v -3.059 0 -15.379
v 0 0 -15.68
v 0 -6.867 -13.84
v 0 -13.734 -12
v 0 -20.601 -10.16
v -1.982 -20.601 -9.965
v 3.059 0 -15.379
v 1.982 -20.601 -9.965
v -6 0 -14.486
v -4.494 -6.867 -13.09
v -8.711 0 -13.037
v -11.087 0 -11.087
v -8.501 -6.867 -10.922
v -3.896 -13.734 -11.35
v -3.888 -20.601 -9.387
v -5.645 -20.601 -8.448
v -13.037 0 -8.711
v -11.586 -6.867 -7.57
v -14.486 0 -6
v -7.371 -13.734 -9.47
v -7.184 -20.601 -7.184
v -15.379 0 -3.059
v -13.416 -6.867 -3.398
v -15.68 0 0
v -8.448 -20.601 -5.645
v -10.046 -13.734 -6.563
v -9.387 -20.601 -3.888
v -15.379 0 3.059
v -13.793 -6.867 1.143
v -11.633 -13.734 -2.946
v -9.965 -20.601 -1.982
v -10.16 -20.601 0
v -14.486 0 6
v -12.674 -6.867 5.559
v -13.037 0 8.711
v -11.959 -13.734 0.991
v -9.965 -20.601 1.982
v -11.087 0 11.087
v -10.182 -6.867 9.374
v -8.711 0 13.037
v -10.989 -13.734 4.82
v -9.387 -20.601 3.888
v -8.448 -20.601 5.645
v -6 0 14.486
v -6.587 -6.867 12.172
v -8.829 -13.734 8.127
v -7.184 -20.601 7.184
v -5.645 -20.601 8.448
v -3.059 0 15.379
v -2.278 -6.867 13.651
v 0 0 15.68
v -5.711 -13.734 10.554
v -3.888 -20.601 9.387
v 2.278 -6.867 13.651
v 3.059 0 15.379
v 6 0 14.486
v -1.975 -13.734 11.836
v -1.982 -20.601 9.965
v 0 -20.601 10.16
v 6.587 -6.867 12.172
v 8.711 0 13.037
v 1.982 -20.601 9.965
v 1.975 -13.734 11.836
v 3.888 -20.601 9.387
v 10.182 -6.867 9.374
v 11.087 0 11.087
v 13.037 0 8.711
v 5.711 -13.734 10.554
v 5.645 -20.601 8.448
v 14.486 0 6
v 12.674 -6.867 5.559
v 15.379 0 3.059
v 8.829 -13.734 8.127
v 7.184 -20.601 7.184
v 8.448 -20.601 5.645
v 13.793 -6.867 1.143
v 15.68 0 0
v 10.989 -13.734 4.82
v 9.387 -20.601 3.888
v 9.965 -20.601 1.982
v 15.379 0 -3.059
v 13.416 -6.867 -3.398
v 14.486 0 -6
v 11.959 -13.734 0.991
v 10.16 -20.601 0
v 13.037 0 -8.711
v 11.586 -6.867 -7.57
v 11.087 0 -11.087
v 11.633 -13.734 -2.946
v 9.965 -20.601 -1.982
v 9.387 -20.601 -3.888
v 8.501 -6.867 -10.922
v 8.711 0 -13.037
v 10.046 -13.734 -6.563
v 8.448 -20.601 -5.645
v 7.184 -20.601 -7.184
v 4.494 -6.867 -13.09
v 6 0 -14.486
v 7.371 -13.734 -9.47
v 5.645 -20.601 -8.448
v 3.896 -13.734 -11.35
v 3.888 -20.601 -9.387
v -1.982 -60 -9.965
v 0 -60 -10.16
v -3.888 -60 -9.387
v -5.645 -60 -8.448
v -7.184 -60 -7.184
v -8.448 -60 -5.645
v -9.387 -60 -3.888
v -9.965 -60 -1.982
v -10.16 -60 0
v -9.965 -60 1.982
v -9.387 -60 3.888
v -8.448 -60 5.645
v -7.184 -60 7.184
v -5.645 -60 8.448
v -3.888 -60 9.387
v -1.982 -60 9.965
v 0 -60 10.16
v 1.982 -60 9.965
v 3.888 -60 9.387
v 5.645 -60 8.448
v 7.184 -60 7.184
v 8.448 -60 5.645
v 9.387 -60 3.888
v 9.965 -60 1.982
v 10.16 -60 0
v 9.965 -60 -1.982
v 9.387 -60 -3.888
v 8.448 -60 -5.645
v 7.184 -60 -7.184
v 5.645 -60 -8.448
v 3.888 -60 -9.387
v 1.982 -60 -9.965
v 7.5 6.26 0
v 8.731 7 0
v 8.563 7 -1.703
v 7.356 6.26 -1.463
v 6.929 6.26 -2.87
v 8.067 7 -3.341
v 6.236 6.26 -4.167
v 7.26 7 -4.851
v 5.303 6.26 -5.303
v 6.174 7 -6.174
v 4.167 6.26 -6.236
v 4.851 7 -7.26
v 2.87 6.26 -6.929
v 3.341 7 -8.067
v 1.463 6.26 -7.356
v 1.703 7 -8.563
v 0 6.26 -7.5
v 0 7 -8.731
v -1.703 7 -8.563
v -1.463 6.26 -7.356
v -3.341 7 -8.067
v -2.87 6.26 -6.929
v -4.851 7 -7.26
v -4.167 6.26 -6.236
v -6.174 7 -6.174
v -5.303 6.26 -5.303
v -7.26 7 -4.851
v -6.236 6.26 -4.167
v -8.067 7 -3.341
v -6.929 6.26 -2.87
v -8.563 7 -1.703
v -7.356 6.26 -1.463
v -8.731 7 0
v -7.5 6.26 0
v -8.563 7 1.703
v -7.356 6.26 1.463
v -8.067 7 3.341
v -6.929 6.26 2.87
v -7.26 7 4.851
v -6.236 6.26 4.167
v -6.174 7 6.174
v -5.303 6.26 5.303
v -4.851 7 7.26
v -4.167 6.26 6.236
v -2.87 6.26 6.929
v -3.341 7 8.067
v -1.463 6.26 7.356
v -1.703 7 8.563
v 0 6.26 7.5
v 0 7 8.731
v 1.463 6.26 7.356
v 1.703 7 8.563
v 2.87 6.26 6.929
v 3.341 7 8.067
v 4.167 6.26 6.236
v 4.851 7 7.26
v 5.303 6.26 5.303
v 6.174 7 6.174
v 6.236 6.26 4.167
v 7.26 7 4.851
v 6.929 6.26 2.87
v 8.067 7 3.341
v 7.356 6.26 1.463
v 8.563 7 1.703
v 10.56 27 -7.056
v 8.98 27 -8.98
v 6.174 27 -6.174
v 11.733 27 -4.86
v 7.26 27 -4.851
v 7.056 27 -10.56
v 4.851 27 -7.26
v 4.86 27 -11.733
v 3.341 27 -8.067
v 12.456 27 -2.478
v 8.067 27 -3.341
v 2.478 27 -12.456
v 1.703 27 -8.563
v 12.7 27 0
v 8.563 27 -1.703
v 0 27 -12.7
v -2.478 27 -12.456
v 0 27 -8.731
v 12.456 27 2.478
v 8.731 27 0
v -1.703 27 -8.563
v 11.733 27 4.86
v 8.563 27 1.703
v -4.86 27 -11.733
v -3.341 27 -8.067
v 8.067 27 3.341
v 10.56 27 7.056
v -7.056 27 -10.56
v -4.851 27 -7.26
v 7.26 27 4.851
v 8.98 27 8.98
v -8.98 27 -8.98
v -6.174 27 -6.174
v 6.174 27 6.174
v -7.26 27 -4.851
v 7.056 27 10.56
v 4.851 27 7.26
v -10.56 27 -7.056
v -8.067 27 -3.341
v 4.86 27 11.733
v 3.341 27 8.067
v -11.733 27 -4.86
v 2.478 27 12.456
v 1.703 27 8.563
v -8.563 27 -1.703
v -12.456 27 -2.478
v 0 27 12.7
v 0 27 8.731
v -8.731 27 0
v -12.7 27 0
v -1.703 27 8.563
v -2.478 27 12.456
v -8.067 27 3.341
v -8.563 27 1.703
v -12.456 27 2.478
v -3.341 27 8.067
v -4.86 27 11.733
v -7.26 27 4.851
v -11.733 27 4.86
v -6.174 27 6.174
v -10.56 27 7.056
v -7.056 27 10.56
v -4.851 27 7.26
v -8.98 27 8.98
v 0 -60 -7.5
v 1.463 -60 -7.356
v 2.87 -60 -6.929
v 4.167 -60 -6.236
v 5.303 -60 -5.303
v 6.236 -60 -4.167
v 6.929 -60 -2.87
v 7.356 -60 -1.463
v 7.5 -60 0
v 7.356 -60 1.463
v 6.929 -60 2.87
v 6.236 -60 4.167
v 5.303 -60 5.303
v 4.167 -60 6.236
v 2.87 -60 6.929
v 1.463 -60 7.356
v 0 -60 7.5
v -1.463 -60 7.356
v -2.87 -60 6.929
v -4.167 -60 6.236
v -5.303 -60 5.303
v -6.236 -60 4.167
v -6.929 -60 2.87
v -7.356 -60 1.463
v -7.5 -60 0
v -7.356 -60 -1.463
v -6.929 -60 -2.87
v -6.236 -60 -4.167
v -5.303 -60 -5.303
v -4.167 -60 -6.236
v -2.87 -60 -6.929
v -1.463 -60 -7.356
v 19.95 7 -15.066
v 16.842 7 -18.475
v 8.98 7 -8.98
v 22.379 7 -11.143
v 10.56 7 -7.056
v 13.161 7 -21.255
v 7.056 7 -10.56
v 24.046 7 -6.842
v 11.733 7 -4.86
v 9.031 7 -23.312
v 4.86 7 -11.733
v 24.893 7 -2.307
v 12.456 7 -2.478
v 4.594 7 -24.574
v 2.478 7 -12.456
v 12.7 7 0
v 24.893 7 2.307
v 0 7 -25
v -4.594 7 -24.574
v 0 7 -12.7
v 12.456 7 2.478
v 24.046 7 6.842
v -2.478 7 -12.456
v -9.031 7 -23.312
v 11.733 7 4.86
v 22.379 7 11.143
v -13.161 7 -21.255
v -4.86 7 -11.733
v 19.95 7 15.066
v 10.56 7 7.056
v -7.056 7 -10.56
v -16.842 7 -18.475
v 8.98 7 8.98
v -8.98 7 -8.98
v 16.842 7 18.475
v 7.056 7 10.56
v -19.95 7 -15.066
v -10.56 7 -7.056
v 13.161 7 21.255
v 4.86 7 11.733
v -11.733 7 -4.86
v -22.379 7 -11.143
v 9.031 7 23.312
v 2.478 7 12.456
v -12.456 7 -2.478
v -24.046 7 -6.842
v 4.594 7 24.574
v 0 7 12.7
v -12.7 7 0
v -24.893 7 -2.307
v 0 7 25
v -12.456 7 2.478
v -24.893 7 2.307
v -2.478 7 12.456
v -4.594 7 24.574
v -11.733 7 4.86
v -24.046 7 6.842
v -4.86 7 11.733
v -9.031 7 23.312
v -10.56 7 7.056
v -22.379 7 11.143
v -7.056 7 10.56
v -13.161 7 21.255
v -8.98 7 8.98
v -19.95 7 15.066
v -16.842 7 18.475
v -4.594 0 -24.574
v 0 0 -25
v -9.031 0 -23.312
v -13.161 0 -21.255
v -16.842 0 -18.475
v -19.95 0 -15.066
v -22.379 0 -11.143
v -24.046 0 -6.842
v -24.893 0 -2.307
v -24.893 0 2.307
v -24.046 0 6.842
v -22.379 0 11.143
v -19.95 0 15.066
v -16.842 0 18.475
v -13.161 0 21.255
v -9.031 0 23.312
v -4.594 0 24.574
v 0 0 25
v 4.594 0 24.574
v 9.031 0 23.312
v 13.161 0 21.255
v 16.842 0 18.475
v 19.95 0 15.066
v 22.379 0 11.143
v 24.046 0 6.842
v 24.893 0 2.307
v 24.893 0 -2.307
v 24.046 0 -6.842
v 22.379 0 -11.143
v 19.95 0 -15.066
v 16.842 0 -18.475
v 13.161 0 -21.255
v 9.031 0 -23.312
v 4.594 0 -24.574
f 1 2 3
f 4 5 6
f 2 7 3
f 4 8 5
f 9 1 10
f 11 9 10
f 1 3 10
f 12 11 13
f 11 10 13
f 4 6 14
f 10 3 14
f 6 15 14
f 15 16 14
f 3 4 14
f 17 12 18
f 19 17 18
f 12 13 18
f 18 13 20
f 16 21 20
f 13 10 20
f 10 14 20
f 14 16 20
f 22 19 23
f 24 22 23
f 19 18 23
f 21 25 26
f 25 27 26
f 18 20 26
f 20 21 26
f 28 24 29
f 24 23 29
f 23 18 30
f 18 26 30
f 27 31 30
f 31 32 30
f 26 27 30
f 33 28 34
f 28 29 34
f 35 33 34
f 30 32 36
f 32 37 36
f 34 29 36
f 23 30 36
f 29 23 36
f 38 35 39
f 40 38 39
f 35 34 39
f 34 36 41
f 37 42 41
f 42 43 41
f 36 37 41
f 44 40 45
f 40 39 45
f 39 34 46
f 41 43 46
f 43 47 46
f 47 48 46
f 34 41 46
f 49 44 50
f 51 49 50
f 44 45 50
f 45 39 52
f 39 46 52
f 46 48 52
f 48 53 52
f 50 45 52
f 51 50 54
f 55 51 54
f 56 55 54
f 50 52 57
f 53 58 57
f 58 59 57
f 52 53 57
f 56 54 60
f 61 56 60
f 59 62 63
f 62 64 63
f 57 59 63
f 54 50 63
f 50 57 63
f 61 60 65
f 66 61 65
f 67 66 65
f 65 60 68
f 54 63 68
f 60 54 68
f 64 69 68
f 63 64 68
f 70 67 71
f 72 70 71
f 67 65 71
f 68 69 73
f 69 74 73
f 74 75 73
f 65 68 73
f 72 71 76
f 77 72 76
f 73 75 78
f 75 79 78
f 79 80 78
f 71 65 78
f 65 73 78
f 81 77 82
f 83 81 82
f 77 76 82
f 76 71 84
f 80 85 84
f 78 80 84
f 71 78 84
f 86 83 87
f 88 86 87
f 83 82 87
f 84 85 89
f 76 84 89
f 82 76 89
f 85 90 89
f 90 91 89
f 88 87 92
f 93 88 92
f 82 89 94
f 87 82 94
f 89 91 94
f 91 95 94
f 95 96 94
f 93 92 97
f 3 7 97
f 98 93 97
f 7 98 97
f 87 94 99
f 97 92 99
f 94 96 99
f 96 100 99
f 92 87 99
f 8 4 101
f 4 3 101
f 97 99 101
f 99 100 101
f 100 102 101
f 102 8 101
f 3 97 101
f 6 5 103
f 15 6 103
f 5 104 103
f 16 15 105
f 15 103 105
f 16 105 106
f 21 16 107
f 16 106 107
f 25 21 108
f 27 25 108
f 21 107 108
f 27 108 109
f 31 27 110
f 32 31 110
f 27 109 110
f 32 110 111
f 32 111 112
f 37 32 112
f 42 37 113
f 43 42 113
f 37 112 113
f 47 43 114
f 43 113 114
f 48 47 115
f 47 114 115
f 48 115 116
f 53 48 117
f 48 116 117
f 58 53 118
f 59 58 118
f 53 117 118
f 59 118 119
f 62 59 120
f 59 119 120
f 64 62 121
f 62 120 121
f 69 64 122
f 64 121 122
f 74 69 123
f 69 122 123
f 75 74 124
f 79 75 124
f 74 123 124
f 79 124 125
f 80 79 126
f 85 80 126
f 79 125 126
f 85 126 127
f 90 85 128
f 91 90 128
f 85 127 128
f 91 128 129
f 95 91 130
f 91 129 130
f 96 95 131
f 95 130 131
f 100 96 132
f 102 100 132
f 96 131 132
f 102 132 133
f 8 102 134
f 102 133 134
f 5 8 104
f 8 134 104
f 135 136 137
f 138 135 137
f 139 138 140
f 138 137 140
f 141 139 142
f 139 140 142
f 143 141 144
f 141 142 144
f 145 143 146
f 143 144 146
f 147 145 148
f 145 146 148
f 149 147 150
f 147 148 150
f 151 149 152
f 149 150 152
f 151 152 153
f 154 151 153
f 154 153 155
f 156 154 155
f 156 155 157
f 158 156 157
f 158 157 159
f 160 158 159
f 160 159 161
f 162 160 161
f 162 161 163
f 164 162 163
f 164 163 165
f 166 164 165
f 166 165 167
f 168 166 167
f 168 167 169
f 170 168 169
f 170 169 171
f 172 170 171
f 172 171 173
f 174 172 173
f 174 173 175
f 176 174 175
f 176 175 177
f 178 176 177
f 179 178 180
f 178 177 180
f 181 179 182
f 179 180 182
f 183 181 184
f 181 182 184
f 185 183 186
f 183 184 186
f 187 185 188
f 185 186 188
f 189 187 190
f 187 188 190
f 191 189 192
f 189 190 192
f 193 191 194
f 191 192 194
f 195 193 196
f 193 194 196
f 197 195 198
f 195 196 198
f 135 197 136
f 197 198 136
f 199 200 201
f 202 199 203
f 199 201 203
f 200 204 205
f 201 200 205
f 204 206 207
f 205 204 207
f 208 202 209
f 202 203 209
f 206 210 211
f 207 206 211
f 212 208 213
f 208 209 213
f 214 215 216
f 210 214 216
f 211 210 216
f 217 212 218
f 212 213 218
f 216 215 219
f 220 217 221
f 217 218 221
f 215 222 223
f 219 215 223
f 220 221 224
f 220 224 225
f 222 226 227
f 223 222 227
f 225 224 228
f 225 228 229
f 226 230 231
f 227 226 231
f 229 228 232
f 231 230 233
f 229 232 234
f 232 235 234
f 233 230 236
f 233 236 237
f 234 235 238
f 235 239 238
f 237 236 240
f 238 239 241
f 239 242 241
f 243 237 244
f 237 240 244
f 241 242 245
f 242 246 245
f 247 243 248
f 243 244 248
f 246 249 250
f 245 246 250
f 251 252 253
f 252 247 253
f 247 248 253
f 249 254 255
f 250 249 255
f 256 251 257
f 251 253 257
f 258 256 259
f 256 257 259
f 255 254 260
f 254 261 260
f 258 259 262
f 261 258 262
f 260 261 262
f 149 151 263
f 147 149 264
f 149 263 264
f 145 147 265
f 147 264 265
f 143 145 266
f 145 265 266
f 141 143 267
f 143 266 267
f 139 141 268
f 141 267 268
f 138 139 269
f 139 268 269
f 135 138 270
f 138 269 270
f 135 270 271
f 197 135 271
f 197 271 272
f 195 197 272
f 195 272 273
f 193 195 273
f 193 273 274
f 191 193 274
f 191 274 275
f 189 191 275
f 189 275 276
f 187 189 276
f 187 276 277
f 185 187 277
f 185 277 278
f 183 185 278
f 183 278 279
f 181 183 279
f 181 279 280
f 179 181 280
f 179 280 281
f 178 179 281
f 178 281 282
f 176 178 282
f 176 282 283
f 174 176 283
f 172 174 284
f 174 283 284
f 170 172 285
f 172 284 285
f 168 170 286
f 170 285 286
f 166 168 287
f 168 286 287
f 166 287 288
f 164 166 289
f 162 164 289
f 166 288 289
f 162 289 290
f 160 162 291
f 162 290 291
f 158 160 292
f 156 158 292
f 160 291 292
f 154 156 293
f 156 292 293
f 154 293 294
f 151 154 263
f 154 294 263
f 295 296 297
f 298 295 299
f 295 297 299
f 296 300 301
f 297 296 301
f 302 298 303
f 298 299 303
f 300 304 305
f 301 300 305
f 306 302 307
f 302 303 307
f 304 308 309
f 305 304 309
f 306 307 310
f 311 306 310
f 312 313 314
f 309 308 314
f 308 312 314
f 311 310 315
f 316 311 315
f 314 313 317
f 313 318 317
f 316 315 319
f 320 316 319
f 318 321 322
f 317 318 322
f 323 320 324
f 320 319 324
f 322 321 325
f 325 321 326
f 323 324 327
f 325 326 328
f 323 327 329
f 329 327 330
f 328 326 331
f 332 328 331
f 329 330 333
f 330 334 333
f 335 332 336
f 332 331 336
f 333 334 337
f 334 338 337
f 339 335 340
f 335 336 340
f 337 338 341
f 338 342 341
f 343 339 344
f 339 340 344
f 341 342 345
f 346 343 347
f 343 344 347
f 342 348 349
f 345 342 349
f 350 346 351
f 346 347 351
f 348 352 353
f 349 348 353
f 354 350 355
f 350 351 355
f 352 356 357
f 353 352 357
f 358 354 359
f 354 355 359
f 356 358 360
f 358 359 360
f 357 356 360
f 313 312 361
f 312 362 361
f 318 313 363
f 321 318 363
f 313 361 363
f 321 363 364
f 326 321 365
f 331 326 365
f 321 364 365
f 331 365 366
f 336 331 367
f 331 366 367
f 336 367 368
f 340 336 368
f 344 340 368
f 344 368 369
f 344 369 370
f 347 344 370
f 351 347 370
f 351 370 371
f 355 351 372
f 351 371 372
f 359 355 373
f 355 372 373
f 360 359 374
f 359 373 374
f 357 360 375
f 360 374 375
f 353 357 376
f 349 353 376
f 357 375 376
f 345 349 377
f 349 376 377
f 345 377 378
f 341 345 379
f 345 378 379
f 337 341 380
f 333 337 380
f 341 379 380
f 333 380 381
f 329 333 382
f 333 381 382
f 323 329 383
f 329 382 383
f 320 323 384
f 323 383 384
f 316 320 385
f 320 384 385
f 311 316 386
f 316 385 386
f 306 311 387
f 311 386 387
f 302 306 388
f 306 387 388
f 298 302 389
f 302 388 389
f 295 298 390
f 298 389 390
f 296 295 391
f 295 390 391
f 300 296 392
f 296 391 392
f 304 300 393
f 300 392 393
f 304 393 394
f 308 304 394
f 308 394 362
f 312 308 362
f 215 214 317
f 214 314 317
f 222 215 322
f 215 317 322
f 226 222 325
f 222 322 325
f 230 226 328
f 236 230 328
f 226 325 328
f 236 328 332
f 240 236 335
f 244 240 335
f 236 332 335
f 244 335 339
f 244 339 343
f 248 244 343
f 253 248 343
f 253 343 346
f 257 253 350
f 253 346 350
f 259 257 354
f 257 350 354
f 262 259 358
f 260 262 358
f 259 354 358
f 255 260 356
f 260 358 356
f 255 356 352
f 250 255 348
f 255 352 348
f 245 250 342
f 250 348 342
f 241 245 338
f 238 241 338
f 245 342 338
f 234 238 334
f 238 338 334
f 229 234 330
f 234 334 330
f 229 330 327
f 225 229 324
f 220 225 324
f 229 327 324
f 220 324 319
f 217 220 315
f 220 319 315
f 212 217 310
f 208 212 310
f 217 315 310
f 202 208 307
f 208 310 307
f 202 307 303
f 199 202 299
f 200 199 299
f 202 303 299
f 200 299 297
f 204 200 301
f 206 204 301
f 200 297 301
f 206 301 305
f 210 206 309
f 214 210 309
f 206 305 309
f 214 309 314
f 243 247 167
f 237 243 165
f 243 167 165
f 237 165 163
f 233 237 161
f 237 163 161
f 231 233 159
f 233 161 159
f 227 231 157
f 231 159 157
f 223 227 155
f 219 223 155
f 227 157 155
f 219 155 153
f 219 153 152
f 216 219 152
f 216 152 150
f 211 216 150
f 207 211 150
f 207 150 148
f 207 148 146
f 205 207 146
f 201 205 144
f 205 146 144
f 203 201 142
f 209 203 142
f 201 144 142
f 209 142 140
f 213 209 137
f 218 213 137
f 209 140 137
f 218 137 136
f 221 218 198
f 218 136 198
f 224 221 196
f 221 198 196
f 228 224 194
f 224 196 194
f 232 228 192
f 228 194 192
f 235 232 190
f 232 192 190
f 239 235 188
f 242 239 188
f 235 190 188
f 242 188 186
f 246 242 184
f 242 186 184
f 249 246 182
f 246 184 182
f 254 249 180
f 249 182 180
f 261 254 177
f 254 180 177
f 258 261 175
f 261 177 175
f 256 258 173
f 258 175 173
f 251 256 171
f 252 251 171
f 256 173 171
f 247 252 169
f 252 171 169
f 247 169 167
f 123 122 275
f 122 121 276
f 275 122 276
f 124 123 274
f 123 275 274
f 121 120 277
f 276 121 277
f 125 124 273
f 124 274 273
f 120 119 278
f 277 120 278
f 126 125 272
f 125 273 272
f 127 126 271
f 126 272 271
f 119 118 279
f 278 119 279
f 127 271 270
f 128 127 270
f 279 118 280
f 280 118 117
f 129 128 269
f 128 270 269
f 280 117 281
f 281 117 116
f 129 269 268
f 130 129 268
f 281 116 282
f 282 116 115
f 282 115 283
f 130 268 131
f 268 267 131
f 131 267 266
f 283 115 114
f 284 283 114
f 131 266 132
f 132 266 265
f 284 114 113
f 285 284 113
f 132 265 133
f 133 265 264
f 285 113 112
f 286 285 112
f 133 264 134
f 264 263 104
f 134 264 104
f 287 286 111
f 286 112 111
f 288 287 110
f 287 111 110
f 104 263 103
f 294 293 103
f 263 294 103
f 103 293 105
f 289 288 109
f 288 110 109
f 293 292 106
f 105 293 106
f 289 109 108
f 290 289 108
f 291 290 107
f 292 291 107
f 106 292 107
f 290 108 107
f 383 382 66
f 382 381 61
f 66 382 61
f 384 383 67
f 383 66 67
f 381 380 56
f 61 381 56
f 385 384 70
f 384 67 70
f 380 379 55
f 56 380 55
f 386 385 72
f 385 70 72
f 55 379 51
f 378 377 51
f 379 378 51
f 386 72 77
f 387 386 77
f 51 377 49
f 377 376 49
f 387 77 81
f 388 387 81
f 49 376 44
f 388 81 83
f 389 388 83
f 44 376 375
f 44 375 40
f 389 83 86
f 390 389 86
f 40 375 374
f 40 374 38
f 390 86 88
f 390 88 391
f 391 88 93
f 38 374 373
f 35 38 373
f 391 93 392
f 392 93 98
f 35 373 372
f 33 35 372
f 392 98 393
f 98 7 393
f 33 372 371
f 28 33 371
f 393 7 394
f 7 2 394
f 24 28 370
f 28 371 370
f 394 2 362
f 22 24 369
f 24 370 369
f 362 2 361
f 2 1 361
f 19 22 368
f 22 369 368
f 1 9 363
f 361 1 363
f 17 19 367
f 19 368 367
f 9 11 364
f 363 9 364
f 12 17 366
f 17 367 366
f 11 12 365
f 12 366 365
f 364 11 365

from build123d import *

# Parameters (mm, degrees)
F_3_4_16_TAPPED_HOLE1_D     = 17.4625
F_3_4_16_TAPPED_HOLE1_DEPTH = 20
F_3_4_16_TAPPED_HOLE1_TIP   = 5.24626428
CUT_EXTRUDE1_REACH          = 95.91
SKETCH5_R                   = 7.5


with BuildPart() as part:
    # Sketch1 → Revolve1 (revolve)
    with BuildSketch(Plane(origin=(0, 0, 0), x_dir=(0, 0, -1), z_dir=(1, 0, 0))):
        Polygon((0, 27), (12.7, 27), (12.7, 7), (25, 7), (25, 0), (15.68, 0), (10.16, -20.600920458), (10.16, -60), (0, -60), align=None)
    revolve(axis=Axis((0, 0, 0), (0, 1, 0)))

    # 3/4-16 Tapped Hole1
    with Locations(Plane(origin=(0, 27, 0), x_dir=(1, 0, 0), z_dir=(0, 1, 0))):
        with Locations((0, 0)):
            Hole(F_3_4_16_TAPPED_HOLE1_D / 2, depth=F_3_4_16_TAPPED_HOLE1_DEPTH)
            with Locations((0, 0, -(F_3_4_16_TAPPED_HOLE1_DEPTH + F_3_4_16_TAPPED_HOLE1_TIP / 2))):  # 118° drill point
                Cone(0, F_3_4_16_TAPPED_HOLE1_D / 2, F_3_4_16_TAPPED_HOLE1_TIP, mode=Mode.SUBTRACT)

    # Cut-Extrude1: up to this cone (the profile starts outside it)
    cut_extrude1_end = Plane(origin=(0, -60, 0), z_dir=(0, 1, 0)).offset(61.75373672) * Cone(1.664e-06, 57.677709576, 34.65626328, align=(Align.CENTER, Align.CENTER, Align.MIN), mode=Mode.PRIVATE)
    # Sketch5 → Cut-Extrude1 (cut, up to the surface)
    with BuildSketch(Plane.XZ.offset(60), mode=Mode.PRIVATE) as cut_extrude1_sk1:
        with Locations(Location((0, 0, 0), (0, 0, 270))):
            Circle(SKETCH5_R)
    cut_extrude1_tool1 = extrude(cut_extrude1_sk1.sketch, amount=-CUT_EXTRUDE1_REACH, mode=Mode.PRIVATE) - cut_extrude1_end
    add(cut_extrude1_tool1.solids().sort_by_distance((0, -60, 0))[0], mode=Mode.SUBTRACT)


solid = part.part
